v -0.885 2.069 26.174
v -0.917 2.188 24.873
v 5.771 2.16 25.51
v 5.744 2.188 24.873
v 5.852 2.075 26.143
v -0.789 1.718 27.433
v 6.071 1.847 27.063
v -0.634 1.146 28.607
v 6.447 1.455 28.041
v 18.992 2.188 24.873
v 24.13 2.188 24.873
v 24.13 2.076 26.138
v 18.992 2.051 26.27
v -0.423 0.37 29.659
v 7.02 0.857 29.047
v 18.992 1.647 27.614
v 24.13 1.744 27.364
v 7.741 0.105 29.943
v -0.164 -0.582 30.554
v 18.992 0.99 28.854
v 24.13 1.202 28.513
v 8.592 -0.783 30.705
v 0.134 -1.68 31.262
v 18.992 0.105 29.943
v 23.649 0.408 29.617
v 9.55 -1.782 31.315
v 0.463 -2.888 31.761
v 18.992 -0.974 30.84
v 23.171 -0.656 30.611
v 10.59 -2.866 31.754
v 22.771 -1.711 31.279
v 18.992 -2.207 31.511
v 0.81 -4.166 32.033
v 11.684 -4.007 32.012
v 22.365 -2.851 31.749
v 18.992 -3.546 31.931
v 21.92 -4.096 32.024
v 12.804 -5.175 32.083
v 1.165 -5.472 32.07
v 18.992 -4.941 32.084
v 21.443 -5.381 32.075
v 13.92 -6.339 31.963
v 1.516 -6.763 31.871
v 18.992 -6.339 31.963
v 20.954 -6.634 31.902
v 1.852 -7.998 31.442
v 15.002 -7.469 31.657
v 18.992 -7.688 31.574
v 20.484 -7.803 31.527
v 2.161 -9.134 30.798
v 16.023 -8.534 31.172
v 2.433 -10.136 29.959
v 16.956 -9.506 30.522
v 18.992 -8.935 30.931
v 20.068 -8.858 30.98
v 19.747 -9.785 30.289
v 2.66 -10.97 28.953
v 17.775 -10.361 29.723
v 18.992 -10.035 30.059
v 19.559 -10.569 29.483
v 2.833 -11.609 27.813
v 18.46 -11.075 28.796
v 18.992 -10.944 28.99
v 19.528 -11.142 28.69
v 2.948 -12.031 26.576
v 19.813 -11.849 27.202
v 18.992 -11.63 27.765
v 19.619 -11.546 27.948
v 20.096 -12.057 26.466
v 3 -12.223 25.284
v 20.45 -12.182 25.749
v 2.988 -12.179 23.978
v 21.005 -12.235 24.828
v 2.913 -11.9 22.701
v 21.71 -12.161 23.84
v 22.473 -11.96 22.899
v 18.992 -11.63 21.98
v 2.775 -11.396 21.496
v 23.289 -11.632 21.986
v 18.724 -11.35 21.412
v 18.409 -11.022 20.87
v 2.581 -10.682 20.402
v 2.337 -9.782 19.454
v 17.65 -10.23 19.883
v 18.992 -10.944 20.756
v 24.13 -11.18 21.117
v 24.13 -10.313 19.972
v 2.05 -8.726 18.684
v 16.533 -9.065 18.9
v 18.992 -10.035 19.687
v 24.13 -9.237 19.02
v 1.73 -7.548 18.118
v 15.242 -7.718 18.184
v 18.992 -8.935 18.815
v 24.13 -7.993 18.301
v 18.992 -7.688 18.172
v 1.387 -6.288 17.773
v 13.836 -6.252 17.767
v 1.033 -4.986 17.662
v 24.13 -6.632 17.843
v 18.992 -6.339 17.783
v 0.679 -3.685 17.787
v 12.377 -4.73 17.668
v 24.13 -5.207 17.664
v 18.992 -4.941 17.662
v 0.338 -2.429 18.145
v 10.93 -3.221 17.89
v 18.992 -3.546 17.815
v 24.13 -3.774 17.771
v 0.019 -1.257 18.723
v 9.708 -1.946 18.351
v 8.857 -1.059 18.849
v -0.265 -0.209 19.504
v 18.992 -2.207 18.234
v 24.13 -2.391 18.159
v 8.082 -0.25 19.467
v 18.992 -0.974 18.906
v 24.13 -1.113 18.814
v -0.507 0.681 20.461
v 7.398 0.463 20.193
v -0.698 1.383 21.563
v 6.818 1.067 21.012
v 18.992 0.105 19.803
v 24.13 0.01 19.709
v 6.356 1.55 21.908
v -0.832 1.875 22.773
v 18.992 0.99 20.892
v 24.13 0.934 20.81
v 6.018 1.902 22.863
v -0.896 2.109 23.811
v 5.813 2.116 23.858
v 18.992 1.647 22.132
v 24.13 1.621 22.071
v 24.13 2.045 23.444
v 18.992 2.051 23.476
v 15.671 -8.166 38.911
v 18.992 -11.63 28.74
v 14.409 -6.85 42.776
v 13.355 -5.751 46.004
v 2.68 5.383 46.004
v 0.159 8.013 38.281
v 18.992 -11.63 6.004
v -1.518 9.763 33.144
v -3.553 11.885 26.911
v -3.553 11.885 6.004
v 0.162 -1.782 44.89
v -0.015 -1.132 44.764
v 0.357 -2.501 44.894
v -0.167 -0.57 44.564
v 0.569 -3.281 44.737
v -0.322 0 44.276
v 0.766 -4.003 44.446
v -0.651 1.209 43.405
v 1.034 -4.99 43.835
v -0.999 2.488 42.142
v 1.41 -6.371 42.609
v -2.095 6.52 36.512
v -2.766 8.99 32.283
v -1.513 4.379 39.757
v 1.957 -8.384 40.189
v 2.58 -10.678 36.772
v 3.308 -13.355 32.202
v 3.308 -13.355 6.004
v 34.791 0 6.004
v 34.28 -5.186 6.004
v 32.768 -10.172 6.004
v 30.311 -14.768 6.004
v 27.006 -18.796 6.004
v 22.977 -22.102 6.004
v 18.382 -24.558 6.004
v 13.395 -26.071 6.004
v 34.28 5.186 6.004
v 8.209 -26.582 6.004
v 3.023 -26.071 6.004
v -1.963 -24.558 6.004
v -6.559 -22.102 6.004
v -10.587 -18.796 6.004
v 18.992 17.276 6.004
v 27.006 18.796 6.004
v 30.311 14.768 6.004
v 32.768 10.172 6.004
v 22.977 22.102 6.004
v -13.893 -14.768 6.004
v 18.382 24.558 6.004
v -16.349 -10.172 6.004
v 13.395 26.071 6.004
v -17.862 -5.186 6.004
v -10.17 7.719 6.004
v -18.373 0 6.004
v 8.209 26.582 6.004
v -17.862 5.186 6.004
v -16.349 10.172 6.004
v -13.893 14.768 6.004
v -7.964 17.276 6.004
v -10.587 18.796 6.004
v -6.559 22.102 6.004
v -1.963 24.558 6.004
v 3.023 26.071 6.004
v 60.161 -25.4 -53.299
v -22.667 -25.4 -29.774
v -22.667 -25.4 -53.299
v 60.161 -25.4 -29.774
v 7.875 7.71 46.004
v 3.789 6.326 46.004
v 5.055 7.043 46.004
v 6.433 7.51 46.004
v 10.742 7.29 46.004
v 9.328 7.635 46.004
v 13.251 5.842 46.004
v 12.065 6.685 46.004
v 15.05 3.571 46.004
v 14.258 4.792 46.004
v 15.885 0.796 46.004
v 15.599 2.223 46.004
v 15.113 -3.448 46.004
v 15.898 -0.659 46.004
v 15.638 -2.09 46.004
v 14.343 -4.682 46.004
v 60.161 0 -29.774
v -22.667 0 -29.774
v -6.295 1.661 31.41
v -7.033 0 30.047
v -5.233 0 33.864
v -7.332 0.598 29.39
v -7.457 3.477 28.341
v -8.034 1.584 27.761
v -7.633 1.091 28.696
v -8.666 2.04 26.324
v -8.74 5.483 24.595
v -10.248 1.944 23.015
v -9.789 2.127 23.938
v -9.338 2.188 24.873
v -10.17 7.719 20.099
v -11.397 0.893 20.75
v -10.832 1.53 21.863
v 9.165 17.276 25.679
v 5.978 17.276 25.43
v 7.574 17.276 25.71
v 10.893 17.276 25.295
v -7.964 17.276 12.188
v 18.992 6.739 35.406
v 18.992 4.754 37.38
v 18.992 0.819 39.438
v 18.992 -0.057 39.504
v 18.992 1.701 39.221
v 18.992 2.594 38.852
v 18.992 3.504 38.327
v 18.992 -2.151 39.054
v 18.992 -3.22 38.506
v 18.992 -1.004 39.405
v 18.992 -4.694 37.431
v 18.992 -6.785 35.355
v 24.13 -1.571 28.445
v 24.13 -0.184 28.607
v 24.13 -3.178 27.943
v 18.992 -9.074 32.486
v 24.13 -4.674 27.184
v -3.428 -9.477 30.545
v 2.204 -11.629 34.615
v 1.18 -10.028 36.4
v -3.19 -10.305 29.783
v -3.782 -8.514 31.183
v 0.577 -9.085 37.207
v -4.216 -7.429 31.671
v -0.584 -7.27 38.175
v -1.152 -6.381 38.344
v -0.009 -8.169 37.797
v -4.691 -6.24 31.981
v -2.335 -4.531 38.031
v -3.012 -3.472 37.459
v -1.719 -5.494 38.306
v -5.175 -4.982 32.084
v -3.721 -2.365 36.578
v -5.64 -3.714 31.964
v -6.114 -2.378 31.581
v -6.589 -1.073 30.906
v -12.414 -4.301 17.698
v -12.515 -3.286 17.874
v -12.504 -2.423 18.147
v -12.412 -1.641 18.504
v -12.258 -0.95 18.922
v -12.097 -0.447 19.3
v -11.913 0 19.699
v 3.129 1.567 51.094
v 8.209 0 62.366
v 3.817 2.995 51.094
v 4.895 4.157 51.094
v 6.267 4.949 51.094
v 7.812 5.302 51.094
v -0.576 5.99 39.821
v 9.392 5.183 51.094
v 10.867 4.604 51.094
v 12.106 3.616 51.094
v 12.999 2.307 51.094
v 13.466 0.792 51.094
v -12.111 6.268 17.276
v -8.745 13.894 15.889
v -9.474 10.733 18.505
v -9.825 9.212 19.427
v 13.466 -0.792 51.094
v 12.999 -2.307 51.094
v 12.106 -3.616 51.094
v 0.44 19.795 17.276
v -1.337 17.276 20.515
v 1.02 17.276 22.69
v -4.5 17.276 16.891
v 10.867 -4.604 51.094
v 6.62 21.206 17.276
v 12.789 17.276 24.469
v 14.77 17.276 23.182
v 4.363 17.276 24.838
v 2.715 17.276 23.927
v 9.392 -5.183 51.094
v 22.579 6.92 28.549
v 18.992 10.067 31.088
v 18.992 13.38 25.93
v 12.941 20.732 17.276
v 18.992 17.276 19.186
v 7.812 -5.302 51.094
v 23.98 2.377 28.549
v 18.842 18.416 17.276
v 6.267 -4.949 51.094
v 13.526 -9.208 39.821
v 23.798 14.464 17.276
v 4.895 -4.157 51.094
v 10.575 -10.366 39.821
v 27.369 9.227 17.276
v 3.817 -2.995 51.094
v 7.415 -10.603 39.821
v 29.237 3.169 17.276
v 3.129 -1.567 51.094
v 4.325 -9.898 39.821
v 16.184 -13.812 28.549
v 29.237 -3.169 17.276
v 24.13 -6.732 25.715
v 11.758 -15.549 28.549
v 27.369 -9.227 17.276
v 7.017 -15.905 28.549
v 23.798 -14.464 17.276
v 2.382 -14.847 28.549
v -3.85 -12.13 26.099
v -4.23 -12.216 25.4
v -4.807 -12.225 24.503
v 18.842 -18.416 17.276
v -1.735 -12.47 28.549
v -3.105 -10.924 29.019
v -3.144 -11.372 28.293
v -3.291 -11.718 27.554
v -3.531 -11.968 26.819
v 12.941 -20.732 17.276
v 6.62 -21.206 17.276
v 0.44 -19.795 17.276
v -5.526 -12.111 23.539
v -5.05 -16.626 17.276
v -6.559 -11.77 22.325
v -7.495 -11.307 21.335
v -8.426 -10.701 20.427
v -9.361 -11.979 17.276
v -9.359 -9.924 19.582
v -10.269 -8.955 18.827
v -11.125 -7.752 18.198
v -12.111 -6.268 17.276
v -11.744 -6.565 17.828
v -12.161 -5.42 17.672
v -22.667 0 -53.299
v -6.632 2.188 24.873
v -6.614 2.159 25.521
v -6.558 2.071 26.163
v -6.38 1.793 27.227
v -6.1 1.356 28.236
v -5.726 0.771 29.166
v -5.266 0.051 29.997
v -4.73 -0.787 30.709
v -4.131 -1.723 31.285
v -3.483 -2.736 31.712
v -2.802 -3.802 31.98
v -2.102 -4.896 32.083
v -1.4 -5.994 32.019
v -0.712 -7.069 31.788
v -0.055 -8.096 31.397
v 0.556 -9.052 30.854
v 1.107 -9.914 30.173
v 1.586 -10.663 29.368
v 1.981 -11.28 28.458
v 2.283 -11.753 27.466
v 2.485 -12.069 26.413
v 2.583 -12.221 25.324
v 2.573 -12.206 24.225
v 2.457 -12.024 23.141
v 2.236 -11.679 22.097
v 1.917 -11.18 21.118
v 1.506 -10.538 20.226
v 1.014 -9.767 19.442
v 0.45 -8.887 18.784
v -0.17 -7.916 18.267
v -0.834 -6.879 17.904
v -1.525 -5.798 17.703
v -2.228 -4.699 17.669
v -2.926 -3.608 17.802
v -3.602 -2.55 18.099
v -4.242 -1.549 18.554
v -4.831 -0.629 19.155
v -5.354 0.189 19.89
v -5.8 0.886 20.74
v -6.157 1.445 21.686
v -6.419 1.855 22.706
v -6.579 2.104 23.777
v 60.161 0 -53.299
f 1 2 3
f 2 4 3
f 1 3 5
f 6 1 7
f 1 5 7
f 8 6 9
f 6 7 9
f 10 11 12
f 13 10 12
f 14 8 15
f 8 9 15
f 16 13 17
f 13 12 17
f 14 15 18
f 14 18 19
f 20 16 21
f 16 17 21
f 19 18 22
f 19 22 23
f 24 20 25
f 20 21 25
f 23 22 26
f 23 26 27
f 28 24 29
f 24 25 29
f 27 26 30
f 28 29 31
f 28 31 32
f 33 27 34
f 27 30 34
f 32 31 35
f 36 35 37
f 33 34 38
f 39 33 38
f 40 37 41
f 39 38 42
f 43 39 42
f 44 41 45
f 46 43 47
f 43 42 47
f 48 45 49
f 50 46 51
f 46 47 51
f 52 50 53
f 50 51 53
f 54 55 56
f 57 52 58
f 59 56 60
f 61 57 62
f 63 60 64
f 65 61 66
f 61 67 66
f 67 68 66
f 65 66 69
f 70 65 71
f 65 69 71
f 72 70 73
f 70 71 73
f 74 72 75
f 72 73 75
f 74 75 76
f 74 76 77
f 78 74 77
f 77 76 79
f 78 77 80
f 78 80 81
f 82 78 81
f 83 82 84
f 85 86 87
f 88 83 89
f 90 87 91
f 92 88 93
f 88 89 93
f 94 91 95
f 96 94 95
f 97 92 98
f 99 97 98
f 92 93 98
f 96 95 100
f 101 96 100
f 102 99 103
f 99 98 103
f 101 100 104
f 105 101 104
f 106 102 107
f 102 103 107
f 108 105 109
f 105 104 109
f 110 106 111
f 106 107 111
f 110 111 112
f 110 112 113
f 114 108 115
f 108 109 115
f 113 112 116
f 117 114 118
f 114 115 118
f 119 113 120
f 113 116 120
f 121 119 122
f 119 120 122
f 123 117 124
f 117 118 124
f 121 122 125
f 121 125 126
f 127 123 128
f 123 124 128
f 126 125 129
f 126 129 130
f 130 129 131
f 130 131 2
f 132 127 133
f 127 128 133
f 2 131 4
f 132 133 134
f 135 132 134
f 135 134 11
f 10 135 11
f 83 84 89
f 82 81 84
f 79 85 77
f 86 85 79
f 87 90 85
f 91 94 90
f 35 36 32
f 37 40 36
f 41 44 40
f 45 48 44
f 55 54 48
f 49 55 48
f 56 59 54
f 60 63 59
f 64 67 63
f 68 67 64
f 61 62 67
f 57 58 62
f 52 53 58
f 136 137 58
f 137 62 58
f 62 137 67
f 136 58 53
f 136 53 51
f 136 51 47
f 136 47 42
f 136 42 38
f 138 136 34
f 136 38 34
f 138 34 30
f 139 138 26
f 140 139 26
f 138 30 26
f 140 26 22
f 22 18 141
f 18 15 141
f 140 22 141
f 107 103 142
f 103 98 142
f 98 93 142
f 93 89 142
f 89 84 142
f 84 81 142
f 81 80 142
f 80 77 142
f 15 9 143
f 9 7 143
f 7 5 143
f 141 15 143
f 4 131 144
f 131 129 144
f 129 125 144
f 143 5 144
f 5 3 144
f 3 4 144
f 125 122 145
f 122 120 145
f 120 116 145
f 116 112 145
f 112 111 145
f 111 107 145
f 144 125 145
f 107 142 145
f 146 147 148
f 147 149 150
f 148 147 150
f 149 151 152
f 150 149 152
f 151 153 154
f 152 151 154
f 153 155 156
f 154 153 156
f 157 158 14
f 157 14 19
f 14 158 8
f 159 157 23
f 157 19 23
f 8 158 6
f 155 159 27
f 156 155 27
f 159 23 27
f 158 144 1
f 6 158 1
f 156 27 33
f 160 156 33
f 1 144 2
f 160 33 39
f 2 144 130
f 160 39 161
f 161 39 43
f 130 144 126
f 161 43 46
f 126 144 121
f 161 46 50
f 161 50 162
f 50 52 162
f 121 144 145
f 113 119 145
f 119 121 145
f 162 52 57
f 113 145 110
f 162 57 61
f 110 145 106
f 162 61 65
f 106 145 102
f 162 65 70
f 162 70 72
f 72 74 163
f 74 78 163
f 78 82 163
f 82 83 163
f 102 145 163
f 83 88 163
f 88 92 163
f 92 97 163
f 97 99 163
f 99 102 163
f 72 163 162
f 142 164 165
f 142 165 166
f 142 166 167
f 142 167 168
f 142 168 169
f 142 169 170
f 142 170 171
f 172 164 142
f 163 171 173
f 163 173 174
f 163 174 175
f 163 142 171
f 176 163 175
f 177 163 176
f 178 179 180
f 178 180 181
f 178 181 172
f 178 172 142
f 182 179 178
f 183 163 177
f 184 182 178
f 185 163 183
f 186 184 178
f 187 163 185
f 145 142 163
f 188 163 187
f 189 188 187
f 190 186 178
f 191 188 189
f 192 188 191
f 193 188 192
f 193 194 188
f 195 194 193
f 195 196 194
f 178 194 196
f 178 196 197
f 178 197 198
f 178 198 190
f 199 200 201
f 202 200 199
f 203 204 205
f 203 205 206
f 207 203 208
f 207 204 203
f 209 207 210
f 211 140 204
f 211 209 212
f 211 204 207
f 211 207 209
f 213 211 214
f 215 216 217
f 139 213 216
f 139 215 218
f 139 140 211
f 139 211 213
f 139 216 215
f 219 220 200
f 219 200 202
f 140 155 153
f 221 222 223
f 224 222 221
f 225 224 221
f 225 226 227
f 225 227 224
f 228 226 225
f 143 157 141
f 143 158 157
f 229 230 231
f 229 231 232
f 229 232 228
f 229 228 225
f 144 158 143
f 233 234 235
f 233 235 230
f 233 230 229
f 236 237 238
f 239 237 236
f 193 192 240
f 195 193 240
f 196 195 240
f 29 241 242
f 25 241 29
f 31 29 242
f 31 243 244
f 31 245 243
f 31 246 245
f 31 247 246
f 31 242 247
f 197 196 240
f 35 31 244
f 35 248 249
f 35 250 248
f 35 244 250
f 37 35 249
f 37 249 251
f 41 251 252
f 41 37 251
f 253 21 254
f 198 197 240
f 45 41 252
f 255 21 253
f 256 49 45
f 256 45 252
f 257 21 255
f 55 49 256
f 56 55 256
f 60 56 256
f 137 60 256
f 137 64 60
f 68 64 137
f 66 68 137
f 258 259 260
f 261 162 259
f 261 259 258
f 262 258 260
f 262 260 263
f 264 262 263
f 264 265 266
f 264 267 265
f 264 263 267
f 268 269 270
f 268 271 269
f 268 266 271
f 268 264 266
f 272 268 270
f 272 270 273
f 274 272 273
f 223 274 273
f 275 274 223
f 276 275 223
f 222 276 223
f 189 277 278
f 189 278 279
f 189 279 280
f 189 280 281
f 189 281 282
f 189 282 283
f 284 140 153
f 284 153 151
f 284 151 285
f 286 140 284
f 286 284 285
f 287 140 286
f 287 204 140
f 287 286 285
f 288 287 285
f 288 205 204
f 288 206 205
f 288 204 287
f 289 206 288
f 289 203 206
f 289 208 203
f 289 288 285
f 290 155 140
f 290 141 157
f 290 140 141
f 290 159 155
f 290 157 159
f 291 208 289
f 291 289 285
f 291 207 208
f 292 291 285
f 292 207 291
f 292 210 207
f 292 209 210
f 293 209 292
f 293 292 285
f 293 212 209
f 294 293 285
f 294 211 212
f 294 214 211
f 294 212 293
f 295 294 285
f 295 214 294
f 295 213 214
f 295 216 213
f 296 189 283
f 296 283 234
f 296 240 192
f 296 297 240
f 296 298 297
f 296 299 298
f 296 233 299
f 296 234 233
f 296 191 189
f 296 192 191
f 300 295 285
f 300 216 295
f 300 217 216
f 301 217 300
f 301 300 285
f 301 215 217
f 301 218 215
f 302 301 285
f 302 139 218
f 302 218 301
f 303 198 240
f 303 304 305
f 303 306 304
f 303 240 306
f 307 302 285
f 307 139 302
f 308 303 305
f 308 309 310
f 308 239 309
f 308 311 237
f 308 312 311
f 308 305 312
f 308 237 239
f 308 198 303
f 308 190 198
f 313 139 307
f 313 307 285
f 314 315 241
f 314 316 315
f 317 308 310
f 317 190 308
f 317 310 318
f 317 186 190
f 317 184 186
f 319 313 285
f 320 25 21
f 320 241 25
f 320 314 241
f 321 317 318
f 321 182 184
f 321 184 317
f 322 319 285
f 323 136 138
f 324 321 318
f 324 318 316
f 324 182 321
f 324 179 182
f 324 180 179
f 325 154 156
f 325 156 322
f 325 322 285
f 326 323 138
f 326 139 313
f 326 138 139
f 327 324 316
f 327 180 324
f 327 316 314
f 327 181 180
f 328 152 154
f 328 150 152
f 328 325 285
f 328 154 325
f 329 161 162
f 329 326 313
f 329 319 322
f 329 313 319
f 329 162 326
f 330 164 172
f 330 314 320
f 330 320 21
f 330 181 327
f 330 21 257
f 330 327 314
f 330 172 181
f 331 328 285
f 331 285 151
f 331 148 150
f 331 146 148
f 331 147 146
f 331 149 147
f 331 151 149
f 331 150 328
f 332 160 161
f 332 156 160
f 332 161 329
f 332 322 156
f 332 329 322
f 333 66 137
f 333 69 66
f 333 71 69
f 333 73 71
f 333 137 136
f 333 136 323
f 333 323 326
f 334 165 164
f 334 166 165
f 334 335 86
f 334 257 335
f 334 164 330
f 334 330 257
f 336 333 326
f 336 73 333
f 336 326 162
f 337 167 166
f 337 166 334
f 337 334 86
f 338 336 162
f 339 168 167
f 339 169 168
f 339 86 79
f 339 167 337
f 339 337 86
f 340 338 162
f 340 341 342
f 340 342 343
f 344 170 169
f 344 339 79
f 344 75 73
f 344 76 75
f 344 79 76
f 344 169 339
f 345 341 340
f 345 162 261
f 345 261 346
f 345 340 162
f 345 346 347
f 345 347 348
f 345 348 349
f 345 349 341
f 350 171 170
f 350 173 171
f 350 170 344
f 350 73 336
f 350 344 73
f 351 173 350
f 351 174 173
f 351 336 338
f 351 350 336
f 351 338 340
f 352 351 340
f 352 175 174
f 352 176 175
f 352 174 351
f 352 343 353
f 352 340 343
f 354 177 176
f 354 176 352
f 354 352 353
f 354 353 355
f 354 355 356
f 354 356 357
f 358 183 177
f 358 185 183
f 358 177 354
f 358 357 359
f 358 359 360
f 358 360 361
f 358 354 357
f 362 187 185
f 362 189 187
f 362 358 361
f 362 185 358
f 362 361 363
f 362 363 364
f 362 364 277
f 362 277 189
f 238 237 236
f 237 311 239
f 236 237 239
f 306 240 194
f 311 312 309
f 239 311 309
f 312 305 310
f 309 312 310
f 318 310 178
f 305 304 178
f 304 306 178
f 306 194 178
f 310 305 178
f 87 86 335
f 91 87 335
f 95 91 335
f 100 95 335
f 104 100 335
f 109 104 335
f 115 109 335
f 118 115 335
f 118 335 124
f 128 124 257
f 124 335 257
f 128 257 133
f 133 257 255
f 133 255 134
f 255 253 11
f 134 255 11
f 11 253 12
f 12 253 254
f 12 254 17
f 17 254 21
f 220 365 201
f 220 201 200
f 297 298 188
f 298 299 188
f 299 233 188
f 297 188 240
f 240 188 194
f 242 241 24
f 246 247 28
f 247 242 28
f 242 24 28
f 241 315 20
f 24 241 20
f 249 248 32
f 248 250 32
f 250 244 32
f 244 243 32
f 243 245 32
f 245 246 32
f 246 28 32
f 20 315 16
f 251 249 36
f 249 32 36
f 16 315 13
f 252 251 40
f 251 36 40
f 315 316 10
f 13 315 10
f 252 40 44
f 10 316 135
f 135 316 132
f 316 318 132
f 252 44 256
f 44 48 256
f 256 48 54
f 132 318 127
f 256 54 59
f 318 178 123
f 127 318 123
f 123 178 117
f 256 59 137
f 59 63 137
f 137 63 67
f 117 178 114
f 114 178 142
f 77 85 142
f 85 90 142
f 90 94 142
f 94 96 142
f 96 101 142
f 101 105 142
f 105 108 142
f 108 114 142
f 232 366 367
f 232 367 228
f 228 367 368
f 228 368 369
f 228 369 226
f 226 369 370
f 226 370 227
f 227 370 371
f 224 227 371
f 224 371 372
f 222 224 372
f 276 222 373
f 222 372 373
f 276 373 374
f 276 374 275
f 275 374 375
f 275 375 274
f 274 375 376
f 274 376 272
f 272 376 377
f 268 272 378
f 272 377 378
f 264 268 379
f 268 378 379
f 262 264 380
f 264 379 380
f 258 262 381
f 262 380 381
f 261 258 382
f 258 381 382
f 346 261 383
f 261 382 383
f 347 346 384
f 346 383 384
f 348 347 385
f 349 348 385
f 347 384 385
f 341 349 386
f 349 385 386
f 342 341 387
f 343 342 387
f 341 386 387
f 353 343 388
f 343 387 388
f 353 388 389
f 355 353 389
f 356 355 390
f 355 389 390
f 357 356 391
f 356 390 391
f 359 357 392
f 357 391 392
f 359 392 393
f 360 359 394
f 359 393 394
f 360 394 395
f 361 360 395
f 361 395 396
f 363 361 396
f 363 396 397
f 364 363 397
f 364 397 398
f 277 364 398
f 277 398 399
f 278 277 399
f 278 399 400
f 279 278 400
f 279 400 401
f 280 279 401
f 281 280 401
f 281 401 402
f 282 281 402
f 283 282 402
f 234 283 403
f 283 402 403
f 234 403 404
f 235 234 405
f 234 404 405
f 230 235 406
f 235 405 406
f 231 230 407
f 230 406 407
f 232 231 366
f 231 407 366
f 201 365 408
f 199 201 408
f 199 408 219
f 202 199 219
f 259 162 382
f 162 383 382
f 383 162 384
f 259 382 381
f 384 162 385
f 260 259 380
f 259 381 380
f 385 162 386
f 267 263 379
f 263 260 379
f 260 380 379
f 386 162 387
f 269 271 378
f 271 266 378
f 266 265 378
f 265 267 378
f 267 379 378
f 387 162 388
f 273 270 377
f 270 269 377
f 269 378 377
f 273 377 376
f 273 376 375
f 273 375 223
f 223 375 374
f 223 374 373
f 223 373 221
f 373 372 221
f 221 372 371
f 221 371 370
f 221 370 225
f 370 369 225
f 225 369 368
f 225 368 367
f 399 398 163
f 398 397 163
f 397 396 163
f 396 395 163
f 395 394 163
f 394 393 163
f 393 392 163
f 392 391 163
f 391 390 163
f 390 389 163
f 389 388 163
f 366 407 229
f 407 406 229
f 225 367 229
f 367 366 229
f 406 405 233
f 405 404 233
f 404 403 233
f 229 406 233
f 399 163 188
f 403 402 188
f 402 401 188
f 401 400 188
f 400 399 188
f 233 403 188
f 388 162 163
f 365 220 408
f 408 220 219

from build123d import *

# Parameters (mm, degrees)
F2_W     = 82.828117
F2_H     = 23.525143
F3_DEPTH = 25.4
F4_R     = 7.211407
F5_DEPTH = 24.13
F7_DEPTH = 40


with BuildPart() as f1:
    # F0 (on Front) → F1 (revolve)
    with BuildSketch(Plane.XZ):
        Polygon((8.209297, 6.003813), (8.209297, 62.366143), (-18.372567, 6.003813), align=None)
    revolve(axis=Axis((8.209297, 0, 34.184978), (0, 0, -1)))

    # F4 (on Right) → F5 (cut, symmetric)
    with BuildSketch(Plane.YZ):
        with Locations((-5.023599, 24.87294)):
            Circle(F4_R)
    extrude(amount=F5_DEPTH, both=True, mode=Mode.SUBTRACT)

    # F6 (on face) → F7 (cut)
    with BuildSketch(Plane(origin=(0, 0, 6.003813), x_dir=(1, 0, 0), z_dir=(0, 0, -1))):
        Polygon((-7.964242, -17.27628), (0, -17.27628), (18.991655, -17.27628), (18.991655, 11.629508), (-3.553277, -11.8851), (3.308224, 13.355422), (-10.169725, -7.719188), align=None)
    extrude(amount=-F7_DEPTH, mode=Mode.SUBTRACT)


with BuildPart() as f3:
    # F2 (on Front) → F3 (new body)
    with BuildSketch(Plane.XZ):
        with Locations((18.7466, -41.536583)):
            Rectangle(F2_W, F2_H)
    extrude(amount=F3_DEPTH)


solid = Compound([f1.part, f3.part])
